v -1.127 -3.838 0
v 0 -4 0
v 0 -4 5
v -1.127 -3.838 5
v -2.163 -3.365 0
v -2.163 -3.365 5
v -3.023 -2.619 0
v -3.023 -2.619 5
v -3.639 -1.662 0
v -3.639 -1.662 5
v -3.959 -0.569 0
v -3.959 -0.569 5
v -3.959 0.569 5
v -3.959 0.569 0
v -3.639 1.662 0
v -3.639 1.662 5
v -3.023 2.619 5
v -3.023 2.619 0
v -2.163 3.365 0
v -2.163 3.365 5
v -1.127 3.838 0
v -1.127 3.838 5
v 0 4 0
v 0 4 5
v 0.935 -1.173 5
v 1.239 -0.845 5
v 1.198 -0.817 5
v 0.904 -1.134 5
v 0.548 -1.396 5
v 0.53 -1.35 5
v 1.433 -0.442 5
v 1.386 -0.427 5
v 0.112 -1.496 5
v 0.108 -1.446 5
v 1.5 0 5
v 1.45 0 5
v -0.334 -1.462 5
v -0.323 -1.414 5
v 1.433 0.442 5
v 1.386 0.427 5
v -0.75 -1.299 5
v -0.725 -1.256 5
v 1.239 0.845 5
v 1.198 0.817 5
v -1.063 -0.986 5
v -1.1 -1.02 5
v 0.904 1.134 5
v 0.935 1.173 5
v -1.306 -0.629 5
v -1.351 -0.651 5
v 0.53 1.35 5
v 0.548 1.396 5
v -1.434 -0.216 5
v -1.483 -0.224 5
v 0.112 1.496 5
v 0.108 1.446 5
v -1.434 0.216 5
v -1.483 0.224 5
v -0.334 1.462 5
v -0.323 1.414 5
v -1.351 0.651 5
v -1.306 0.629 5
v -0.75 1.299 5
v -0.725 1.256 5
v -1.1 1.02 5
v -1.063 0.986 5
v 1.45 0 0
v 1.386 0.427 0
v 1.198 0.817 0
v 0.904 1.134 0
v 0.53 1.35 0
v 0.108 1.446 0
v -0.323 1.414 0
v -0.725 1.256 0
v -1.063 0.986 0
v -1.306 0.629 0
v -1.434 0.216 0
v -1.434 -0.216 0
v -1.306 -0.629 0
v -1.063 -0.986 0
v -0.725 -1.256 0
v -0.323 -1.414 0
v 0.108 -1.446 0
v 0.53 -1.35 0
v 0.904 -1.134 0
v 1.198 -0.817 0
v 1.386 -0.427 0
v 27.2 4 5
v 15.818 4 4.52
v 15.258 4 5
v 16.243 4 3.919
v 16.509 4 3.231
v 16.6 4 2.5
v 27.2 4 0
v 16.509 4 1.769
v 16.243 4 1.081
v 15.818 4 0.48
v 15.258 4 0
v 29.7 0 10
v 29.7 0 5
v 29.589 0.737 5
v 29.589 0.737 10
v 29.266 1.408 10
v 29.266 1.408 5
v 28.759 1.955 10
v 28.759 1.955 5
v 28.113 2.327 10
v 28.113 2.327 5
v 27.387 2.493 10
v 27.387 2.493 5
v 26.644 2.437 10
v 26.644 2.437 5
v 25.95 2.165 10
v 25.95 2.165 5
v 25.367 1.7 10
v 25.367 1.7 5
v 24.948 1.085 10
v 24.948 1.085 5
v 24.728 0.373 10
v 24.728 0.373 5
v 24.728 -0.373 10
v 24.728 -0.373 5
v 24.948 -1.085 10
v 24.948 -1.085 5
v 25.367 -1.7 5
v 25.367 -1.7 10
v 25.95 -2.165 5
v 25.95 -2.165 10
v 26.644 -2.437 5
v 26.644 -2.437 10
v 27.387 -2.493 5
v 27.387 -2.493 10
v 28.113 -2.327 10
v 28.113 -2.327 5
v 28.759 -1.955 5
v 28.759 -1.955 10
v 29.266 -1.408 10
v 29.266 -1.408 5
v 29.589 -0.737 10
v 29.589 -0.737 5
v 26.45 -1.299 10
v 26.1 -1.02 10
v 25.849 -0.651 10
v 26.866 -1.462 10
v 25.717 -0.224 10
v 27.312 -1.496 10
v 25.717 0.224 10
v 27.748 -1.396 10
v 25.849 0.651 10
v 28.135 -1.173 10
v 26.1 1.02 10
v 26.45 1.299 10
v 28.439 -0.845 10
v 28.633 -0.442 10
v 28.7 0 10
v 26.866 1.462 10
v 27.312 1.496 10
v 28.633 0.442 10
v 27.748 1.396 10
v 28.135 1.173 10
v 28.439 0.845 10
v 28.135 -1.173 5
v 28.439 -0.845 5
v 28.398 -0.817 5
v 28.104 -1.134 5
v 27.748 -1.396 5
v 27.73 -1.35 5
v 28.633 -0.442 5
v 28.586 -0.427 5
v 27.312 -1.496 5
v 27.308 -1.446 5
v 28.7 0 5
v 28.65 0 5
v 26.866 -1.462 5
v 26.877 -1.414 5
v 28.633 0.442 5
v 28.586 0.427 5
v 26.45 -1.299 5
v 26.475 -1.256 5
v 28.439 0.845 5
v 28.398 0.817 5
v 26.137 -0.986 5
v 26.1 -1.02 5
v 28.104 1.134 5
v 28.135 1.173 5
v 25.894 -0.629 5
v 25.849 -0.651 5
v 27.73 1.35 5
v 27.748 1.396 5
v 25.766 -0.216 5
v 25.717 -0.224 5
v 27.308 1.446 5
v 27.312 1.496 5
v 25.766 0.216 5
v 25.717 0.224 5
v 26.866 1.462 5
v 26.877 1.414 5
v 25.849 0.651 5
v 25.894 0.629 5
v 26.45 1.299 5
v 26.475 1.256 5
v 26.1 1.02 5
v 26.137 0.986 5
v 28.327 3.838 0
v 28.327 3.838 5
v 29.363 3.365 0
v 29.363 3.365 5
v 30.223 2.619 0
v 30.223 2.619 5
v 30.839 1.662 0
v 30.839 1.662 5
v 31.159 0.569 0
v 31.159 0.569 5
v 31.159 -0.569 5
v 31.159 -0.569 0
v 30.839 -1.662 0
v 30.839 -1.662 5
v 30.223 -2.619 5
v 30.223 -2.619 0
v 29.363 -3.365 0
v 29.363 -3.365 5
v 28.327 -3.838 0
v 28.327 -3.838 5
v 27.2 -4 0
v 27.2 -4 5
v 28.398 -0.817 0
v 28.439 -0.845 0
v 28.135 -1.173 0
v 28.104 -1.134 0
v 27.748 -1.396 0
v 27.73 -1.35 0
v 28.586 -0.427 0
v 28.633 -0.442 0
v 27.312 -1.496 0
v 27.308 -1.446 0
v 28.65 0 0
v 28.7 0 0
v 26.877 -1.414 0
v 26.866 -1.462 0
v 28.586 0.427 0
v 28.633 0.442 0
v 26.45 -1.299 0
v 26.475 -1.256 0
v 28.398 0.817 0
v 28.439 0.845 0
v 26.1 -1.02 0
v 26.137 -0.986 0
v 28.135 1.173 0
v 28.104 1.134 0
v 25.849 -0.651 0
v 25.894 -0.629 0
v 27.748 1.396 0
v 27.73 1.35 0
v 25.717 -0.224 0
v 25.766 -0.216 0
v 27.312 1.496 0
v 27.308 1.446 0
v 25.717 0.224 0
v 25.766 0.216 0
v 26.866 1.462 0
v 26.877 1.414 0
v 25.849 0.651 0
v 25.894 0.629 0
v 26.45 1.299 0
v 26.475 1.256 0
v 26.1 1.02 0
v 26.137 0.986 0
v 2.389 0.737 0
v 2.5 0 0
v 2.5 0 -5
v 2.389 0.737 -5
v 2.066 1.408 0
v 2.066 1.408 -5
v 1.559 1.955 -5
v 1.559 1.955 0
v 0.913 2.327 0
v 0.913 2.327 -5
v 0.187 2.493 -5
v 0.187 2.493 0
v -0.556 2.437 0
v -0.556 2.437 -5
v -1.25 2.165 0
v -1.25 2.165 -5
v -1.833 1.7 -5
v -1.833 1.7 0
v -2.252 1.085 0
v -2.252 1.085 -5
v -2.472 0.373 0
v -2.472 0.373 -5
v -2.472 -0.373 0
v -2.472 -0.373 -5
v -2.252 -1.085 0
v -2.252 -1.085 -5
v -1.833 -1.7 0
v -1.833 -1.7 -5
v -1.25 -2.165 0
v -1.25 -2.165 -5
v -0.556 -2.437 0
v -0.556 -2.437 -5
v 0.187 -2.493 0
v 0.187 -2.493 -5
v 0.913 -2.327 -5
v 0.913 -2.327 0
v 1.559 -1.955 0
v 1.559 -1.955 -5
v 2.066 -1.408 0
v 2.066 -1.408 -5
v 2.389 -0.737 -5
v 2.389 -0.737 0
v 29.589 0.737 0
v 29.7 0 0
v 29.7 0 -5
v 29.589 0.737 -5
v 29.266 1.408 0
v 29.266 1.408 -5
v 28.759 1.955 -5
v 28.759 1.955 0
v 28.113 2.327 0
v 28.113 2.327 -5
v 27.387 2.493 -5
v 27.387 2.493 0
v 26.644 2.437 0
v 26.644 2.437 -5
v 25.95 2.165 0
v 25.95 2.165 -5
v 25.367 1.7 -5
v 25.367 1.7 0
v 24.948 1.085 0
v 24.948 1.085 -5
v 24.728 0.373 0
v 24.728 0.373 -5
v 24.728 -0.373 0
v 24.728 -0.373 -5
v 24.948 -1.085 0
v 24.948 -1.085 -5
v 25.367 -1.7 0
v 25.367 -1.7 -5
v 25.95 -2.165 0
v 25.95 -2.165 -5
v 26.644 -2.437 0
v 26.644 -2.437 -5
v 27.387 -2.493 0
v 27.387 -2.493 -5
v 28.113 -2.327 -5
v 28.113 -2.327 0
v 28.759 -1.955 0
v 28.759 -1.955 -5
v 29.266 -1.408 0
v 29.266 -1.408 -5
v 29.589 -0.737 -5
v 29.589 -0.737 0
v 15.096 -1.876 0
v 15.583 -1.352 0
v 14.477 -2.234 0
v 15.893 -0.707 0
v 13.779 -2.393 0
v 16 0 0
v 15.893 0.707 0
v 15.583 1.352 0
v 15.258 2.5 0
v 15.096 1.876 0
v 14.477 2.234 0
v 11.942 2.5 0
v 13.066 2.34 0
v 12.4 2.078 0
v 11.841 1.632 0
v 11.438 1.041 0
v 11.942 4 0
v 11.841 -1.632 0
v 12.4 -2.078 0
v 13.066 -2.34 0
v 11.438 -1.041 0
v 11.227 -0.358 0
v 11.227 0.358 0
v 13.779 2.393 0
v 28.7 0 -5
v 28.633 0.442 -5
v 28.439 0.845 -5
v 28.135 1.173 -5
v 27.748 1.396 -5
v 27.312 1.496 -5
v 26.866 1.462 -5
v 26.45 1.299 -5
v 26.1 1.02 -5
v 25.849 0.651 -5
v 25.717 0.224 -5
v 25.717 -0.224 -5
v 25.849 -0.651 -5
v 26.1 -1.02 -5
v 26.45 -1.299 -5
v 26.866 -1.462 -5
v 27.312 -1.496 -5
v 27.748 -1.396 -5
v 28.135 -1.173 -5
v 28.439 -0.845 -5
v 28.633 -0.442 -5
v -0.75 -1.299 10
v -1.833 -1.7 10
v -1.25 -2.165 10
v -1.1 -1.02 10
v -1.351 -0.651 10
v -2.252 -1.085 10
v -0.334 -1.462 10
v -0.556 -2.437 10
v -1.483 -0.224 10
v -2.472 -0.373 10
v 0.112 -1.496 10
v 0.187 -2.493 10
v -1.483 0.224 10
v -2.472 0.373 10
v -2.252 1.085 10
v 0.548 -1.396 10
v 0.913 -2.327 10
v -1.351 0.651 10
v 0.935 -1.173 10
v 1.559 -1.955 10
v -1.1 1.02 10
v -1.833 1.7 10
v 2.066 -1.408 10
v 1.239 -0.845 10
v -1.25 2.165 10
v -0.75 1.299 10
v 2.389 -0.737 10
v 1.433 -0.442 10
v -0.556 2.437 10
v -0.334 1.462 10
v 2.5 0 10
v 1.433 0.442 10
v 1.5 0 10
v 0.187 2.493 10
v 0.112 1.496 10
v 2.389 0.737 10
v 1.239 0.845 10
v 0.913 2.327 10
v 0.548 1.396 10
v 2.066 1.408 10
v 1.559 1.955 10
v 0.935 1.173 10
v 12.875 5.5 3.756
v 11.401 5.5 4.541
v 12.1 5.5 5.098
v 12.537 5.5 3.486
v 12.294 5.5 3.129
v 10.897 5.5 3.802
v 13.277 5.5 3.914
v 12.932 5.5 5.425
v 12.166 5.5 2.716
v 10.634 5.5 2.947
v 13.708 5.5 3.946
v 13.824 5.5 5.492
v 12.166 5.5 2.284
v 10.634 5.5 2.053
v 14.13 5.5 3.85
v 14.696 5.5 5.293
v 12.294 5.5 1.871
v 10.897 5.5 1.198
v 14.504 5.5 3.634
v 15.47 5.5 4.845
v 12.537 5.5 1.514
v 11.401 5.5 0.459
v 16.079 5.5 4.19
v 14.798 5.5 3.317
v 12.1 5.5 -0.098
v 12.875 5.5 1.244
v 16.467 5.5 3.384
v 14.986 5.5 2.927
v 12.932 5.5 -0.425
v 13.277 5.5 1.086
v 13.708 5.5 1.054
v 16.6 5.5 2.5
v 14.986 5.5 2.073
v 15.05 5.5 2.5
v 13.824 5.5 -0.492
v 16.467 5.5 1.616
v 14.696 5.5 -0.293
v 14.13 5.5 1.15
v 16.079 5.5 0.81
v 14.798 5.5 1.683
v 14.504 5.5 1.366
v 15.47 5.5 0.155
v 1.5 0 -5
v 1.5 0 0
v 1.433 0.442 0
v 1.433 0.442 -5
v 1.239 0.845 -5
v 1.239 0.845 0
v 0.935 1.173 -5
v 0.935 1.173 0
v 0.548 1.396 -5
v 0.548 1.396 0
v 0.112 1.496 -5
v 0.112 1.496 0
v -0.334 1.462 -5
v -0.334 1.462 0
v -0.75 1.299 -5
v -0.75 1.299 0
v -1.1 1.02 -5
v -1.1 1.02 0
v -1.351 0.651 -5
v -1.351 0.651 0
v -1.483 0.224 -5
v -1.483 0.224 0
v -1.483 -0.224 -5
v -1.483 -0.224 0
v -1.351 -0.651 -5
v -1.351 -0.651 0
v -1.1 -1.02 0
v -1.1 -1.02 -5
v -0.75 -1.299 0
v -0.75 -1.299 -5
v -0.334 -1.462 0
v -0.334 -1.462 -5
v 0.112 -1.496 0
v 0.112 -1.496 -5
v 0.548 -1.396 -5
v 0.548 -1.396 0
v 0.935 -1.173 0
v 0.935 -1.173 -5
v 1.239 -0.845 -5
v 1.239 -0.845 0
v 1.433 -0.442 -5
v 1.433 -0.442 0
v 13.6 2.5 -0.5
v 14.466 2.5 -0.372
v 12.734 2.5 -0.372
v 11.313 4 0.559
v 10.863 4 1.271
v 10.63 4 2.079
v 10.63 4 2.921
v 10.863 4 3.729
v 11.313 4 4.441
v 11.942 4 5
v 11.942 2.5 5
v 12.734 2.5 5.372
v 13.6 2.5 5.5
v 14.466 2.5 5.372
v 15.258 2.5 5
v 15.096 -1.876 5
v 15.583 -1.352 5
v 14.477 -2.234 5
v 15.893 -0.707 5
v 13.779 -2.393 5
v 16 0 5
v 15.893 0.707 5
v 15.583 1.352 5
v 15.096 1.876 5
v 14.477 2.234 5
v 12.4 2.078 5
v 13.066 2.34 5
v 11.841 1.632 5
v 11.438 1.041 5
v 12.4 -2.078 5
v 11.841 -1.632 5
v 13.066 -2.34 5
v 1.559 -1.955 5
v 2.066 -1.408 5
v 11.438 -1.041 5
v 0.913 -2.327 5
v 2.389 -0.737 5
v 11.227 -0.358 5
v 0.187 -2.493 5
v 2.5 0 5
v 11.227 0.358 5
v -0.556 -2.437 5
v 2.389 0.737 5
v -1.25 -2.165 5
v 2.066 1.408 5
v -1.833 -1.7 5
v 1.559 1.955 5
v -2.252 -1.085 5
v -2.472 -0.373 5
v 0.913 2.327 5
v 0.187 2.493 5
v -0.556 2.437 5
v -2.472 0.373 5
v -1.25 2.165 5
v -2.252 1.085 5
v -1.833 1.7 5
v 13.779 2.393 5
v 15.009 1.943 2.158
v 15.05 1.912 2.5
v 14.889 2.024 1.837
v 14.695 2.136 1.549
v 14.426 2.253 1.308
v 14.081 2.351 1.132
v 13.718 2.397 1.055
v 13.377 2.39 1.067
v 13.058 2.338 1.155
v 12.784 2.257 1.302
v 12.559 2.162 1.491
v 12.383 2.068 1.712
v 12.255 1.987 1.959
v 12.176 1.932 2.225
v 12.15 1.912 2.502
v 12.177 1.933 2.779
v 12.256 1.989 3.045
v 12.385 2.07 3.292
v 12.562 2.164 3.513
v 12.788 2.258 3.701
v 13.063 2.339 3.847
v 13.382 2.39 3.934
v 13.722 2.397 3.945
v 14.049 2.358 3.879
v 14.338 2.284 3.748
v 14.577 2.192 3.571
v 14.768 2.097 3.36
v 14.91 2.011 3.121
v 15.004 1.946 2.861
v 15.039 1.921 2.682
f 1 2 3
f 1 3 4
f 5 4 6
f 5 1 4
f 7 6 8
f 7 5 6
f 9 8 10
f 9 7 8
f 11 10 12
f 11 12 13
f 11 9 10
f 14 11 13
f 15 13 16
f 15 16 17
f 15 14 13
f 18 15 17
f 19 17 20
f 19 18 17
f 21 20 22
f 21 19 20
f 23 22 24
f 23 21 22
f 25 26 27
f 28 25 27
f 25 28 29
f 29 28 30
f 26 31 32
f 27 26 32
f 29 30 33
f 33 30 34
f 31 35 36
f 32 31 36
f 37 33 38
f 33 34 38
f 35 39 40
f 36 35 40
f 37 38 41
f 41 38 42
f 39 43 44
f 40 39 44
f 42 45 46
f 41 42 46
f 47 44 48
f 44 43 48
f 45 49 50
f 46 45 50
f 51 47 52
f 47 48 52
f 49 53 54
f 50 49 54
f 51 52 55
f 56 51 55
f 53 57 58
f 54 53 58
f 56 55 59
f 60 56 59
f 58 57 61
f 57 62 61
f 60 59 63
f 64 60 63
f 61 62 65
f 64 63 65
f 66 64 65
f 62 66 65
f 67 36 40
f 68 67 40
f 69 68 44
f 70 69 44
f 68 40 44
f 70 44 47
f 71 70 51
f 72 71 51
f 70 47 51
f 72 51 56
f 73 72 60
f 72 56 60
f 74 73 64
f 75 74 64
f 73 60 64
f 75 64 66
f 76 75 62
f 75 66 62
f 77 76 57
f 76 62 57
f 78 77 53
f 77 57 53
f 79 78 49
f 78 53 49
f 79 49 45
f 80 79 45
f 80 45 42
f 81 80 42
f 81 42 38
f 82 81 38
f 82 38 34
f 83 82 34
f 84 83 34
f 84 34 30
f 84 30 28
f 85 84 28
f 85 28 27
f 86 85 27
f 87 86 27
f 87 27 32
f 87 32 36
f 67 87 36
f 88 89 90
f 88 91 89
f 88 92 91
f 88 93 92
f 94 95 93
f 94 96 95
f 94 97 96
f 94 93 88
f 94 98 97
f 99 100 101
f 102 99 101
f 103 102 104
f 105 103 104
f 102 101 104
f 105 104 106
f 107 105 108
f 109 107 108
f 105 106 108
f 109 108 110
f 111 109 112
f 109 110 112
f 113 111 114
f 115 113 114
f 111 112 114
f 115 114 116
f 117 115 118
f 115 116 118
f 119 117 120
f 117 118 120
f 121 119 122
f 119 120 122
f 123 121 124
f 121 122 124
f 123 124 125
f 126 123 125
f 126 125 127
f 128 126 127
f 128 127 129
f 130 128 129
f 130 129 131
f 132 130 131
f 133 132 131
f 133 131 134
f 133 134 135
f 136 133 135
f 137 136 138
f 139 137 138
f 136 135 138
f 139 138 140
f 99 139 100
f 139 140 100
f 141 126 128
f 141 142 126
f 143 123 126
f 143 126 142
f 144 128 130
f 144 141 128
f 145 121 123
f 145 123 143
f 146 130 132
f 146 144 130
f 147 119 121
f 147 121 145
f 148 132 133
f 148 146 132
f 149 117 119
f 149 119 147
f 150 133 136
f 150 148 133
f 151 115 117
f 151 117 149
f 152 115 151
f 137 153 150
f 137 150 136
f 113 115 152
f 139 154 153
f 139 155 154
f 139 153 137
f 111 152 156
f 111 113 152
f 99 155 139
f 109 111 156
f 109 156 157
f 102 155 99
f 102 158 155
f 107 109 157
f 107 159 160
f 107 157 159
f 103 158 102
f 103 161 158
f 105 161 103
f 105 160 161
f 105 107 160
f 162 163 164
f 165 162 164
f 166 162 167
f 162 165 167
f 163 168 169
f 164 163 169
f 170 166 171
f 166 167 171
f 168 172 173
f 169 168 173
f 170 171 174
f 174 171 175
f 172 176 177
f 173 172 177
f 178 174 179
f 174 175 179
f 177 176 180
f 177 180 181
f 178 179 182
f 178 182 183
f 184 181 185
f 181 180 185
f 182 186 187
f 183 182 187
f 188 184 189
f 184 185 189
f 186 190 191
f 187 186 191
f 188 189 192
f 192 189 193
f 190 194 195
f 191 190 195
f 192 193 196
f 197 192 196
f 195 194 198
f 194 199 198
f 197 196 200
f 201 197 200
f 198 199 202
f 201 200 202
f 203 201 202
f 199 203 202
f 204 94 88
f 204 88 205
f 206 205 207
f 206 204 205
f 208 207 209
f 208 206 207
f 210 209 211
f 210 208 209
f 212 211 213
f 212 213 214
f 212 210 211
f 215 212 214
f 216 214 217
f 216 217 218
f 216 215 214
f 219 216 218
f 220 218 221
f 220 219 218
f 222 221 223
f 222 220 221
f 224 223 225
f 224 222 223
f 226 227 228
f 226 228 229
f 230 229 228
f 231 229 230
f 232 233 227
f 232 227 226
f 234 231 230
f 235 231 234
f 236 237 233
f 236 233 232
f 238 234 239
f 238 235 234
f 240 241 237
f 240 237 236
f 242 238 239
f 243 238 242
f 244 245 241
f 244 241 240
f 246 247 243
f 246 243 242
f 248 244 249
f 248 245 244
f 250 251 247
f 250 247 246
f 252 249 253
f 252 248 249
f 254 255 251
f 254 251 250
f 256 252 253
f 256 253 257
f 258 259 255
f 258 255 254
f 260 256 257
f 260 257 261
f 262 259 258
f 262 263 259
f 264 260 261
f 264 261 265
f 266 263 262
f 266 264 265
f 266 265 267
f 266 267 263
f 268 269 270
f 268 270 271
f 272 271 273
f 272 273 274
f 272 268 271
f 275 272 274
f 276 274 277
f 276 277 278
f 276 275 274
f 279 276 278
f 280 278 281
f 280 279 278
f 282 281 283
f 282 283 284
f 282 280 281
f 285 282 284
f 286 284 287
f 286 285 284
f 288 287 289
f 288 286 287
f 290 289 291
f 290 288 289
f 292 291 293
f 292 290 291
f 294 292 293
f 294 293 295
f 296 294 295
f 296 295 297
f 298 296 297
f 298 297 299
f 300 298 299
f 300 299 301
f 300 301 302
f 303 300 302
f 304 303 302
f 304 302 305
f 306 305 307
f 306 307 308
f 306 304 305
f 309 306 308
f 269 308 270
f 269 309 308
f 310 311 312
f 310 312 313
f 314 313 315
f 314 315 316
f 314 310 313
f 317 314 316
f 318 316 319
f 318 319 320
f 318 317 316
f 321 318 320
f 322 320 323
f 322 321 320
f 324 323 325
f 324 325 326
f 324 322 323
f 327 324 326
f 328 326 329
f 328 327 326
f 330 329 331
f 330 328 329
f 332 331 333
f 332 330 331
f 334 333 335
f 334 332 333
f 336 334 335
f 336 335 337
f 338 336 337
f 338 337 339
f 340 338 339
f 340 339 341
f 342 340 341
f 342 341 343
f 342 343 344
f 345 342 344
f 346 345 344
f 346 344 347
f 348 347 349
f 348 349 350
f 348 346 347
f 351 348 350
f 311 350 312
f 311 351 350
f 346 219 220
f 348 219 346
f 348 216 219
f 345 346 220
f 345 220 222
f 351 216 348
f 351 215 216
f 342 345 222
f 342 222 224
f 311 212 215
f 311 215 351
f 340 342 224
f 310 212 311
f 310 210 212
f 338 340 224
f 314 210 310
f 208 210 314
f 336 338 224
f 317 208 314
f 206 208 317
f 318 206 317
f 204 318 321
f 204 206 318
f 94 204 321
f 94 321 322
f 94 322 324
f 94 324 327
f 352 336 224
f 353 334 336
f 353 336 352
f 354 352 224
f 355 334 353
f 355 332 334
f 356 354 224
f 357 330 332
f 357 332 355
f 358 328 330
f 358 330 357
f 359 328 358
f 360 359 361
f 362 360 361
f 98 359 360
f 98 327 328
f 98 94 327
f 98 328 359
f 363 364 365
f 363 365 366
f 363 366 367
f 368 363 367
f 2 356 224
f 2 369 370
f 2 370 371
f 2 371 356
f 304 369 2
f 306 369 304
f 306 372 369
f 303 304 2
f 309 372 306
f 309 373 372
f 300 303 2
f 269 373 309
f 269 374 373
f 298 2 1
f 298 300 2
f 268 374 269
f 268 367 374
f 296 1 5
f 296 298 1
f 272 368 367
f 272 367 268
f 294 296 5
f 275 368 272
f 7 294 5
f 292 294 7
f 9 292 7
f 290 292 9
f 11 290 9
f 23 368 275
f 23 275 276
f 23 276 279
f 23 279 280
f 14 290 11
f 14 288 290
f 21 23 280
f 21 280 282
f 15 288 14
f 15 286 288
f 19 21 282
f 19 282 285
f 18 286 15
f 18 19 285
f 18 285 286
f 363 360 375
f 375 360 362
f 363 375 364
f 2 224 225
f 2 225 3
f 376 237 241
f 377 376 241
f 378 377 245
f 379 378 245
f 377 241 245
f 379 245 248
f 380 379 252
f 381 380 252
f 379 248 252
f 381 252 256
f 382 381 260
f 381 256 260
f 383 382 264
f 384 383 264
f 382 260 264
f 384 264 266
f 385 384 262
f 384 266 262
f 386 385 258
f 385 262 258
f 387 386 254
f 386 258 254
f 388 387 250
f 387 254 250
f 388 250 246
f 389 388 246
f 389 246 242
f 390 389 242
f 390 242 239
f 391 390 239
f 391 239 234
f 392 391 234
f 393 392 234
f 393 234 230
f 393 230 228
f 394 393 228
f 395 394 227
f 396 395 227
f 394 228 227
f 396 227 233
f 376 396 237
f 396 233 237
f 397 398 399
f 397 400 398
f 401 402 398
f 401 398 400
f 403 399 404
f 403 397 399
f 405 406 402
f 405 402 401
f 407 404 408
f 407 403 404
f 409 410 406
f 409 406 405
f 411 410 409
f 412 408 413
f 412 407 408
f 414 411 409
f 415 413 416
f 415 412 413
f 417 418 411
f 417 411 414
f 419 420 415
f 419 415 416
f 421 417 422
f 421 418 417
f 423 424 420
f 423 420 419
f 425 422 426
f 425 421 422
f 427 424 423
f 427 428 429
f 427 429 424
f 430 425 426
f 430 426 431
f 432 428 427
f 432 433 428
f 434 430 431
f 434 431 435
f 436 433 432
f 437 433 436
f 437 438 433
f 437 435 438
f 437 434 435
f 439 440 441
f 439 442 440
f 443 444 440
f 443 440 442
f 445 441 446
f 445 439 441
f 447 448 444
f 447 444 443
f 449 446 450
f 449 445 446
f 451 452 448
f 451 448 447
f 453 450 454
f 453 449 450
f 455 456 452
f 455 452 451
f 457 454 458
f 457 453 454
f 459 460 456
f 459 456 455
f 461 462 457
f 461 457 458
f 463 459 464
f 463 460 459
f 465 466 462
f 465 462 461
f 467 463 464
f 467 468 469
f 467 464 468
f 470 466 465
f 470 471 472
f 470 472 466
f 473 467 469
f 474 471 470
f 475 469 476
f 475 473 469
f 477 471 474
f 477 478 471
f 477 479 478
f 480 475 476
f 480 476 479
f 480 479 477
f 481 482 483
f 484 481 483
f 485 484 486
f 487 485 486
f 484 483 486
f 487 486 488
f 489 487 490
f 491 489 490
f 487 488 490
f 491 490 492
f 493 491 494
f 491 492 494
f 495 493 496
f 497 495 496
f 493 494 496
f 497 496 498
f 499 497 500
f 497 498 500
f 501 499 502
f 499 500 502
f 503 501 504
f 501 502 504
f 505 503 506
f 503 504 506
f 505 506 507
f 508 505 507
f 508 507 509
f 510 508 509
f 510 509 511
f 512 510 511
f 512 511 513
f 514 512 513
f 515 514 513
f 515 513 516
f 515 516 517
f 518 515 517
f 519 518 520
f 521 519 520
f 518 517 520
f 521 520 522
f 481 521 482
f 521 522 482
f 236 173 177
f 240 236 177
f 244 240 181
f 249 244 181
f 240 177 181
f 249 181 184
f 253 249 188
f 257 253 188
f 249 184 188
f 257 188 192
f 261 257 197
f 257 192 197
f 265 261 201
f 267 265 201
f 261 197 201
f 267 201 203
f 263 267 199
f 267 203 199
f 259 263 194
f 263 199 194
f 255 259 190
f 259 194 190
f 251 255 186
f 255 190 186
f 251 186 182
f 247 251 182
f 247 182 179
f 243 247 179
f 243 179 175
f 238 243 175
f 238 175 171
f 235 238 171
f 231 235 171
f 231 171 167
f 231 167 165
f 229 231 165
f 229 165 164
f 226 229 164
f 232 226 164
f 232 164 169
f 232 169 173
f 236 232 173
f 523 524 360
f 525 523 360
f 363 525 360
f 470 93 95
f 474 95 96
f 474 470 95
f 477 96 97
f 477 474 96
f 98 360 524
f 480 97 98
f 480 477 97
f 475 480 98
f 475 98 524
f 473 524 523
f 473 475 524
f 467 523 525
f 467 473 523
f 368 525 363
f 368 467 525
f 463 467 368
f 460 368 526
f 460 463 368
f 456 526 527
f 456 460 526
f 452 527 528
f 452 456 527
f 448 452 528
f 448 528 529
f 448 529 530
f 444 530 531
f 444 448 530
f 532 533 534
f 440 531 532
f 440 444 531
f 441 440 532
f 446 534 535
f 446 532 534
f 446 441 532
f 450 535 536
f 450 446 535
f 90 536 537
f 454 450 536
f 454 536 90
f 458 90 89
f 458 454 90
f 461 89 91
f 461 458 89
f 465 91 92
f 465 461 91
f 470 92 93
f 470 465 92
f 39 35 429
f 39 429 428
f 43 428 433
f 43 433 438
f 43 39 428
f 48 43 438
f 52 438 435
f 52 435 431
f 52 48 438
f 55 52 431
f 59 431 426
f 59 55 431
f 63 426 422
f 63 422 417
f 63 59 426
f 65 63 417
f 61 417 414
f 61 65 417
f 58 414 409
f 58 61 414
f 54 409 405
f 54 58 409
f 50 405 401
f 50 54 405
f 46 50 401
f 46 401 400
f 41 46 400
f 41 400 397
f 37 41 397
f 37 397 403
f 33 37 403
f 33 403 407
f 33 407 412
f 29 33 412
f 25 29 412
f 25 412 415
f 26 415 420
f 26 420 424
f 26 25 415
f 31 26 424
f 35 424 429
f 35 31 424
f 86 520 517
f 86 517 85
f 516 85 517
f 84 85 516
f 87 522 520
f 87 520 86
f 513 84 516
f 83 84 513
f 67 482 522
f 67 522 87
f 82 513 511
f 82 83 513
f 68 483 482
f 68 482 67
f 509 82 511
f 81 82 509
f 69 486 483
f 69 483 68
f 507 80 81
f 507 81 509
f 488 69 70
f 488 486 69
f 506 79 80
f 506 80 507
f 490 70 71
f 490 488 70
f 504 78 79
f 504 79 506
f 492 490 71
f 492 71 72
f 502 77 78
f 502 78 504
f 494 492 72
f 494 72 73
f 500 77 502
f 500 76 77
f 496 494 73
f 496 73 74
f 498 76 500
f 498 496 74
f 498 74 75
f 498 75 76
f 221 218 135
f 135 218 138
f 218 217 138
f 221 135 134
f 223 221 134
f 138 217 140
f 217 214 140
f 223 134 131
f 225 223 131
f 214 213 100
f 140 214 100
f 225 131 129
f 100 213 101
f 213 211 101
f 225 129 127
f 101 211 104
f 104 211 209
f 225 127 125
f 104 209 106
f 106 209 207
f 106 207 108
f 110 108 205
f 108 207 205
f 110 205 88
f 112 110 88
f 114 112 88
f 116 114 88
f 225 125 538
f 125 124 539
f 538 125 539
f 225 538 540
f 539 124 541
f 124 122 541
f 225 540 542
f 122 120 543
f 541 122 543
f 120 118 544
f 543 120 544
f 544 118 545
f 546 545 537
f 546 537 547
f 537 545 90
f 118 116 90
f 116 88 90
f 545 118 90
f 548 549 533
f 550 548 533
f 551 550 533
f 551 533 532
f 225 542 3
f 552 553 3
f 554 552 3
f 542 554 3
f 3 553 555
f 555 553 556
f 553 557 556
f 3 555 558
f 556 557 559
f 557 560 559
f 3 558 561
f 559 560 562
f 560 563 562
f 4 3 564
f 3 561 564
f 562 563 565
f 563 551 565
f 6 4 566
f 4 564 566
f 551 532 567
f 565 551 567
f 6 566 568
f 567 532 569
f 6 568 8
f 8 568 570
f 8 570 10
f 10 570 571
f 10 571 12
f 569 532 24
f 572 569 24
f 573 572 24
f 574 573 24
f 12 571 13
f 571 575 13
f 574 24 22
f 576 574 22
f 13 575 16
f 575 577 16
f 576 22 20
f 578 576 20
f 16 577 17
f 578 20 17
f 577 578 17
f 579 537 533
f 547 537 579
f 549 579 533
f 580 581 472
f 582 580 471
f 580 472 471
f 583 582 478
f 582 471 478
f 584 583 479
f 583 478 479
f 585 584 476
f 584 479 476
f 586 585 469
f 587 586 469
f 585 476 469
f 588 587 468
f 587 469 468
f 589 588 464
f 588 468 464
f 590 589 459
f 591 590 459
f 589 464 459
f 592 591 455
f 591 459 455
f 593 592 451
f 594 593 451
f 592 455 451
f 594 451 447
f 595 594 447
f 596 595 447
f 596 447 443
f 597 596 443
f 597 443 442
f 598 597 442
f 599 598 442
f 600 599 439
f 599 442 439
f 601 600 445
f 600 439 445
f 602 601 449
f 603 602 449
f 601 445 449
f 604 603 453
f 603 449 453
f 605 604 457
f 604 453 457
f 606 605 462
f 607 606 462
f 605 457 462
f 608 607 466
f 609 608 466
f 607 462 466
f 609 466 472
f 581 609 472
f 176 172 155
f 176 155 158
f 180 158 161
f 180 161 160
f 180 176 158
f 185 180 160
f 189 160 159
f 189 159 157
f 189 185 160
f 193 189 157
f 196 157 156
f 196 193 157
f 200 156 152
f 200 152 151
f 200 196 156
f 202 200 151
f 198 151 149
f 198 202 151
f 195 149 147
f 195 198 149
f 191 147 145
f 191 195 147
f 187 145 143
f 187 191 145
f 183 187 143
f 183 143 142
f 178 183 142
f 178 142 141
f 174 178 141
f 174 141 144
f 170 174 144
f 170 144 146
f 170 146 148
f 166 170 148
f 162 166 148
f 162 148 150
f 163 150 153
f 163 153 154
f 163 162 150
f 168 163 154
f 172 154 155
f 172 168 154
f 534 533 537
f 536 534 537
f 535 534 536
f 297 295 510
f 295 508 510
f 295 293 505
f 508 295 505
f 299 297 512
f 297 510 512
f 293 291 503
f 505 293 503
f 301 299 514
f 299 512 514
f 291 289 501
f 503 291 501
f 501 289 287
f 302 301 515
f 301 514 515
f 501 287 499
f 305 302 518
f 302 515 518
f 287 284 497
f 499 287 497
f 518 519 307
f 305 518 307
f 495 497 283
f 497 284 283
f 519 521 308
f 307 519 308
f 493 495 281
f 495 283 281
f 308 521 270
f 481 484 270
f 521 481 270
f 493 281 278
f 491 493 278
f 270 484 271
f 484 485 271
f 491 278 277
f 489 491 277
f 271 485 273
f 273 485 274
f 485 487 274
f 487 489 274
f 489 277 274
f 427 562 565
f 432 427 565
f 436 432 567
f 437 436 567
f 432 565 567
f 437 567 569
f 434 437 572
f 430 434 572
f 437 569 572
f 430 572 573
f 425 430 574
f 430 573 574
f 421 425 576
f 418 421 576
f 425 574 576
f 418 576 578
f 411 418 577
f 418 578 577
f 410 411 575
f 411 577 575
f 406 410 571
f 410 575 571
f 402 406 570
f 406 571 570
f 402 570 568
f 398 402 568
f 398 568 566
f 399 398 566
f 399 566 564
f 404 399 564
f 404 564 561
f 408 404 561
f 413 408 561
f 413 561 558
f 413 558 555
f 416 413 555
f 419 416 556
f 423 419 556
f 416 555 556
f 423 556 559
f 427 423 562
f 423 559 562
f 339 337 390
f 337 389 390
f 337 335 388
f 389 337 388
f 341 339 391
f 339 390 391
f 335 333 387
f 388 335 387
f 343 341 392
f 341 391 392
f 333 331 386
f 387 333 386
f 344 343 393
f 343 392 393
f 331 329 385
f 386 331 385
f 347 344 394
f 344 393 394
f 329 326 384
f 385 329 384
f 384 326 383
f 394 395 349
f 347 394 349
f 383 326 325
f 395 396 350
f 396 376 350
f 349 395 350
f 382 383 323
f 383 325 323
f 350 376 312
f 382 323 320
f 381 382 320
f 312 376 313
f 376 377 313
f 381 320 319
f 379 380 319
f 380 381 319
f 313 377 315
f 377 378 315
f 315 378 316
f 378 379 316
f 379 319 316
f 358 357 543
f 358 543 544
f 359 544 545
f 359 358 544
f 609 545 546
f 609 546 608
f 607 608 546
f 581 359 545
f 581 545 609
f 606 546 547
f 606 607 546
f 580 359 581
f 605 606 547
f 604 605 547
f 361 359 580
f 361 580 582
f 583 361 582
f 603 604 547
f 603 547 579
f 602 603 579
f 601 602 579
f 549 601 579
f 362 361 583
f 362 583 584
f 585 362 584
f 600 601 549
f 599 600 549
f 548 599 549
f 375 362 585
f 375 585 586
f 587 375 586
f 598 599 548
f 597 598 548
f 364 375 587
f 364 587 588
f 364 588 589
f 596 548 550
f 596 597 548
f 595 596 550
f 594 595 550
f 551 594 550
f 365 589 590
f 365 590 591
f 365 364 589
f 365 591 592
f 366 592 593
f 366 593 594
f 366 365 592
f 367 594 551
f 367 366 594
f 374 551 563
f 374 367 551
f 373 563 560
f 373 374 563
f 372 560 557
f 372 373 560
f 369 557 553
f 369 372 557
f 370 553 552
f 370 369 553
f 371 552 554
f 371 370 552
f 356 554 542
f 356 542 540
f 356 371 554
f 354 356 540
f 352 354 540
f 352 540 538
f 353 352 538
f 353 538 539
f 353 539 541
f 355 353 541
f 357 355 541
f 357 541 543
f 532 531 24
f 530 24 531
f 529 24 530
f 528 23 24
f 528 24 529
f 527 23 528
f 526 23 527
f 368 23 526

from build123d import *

# Parameters (mm, degrees)
SKETCH1_R           = 2.4
BOSS_EXTRUDE1_DEPTH = 5
SKETCH5_R           = 3
BOSS_EXTRUDE3_DEPTH = 1.5
SKETCH6_R           = 1.45
CUT_EXTRUDE4_DEPTH  = 9
SKETCH2_R           = 1.45
CUT_EXTRUDE3_DEPTH  = 4
SKETCH7_R           = 2.5
SKETCH7_R_2         = 1.5
BOSS_EXTRUDE4_DEPTH = 5


with BuildPart() as part:
    # Sketch1 → Boss-Extrude1 (new body)
    with BuildSketch(Plane.XY):
        with BuildLine():
            Line((0, 4), (27.2, 4))
            ThreePointArc((27.2, 4), (31.2, 0), (27.2, -4))
            Line((27.2, -4), (0, -4))
            ThreePointArc((0, -4), (-4, 0), (0, 4))
        make_face()
        with Locations((13.6, 0)):
            Circle(SKETCH1_R, mode=Mode.SUBTRACT)
    extrude(amount=BOSS_EXTRUDE1_DEPTH)

    # Sketch5 → Boss-Extrude3 (add, symmetric)
    with BuildSketch(Plane(origin=(0, 4, 0), x_dir=(1, 0, 0), z_dir=(0, 1, 0))):
        with Locations((13.6, -2.5)):
            Circle(SKETCH5_R)
    extrude(amount=BOSS_EXTRUDE3_DEPTH, both=True)

    # Sketch6 → Cut-Extrude4 (cut)
    with BuildSketch(Plane.XY.offset(5)):
        with Locations((27.2, 0)):
            Circle(SKETCH6_R)
        Circle(SKETCH6_R)
    cut_extrude4 = extrude(amount=-CUT_EXTRUDE4_DEPTH, mode=Mode.SUBTRACT)

    # Sketch2 → Cut-Extrude3 (cut, symmetric)
    with BuildSketch(Plane(origin=(0, 4, 0), x_dir=(1, 0, 0), z_dir=(0, 1, 0))):
        with Locations((13.6, -2.5)):
            Circle(SKETCH2_R)
    extrude(amount=CUT_EXTRUDE3_DEPTH, both=True, mode=Mode.SUBTRACT)

    # Sketch7 → Boss-Extrude4 (add)
    with BuildSketch(Plane.XY.offset(5)):
        with Locations((27.2, 0)):
            Circle(SKETCH7_R)
        with Locations((27.2, 0)):
            Circle(SKETCH7_R_2, mode=Mode.SUBTRACT)
        Circle(SKETCH7_R)
        Circle(SKETCH7_R_2, mode=Mode.SUBTRACT)
    boss_extrude4 = extrude(amount=BOSS_EXTRUDE4_DEPTH)

    # Mirror1: Cut-Extrude4, Boss-Extrude4 across plane
    add(cut_extrude4.mirror(Plane(origin=(0, 0, 2.5), x_dir=(1, 0, 0), z_dir=(0, 0, -1))), mode=Mode.SUBTRACT)
    add(boss_extrude4.mirror(Plane(origin=(0, 0, 2.5), x_dir=(1, 0, 0), z_dir=(0, 0, -1))))


solid = part.part
